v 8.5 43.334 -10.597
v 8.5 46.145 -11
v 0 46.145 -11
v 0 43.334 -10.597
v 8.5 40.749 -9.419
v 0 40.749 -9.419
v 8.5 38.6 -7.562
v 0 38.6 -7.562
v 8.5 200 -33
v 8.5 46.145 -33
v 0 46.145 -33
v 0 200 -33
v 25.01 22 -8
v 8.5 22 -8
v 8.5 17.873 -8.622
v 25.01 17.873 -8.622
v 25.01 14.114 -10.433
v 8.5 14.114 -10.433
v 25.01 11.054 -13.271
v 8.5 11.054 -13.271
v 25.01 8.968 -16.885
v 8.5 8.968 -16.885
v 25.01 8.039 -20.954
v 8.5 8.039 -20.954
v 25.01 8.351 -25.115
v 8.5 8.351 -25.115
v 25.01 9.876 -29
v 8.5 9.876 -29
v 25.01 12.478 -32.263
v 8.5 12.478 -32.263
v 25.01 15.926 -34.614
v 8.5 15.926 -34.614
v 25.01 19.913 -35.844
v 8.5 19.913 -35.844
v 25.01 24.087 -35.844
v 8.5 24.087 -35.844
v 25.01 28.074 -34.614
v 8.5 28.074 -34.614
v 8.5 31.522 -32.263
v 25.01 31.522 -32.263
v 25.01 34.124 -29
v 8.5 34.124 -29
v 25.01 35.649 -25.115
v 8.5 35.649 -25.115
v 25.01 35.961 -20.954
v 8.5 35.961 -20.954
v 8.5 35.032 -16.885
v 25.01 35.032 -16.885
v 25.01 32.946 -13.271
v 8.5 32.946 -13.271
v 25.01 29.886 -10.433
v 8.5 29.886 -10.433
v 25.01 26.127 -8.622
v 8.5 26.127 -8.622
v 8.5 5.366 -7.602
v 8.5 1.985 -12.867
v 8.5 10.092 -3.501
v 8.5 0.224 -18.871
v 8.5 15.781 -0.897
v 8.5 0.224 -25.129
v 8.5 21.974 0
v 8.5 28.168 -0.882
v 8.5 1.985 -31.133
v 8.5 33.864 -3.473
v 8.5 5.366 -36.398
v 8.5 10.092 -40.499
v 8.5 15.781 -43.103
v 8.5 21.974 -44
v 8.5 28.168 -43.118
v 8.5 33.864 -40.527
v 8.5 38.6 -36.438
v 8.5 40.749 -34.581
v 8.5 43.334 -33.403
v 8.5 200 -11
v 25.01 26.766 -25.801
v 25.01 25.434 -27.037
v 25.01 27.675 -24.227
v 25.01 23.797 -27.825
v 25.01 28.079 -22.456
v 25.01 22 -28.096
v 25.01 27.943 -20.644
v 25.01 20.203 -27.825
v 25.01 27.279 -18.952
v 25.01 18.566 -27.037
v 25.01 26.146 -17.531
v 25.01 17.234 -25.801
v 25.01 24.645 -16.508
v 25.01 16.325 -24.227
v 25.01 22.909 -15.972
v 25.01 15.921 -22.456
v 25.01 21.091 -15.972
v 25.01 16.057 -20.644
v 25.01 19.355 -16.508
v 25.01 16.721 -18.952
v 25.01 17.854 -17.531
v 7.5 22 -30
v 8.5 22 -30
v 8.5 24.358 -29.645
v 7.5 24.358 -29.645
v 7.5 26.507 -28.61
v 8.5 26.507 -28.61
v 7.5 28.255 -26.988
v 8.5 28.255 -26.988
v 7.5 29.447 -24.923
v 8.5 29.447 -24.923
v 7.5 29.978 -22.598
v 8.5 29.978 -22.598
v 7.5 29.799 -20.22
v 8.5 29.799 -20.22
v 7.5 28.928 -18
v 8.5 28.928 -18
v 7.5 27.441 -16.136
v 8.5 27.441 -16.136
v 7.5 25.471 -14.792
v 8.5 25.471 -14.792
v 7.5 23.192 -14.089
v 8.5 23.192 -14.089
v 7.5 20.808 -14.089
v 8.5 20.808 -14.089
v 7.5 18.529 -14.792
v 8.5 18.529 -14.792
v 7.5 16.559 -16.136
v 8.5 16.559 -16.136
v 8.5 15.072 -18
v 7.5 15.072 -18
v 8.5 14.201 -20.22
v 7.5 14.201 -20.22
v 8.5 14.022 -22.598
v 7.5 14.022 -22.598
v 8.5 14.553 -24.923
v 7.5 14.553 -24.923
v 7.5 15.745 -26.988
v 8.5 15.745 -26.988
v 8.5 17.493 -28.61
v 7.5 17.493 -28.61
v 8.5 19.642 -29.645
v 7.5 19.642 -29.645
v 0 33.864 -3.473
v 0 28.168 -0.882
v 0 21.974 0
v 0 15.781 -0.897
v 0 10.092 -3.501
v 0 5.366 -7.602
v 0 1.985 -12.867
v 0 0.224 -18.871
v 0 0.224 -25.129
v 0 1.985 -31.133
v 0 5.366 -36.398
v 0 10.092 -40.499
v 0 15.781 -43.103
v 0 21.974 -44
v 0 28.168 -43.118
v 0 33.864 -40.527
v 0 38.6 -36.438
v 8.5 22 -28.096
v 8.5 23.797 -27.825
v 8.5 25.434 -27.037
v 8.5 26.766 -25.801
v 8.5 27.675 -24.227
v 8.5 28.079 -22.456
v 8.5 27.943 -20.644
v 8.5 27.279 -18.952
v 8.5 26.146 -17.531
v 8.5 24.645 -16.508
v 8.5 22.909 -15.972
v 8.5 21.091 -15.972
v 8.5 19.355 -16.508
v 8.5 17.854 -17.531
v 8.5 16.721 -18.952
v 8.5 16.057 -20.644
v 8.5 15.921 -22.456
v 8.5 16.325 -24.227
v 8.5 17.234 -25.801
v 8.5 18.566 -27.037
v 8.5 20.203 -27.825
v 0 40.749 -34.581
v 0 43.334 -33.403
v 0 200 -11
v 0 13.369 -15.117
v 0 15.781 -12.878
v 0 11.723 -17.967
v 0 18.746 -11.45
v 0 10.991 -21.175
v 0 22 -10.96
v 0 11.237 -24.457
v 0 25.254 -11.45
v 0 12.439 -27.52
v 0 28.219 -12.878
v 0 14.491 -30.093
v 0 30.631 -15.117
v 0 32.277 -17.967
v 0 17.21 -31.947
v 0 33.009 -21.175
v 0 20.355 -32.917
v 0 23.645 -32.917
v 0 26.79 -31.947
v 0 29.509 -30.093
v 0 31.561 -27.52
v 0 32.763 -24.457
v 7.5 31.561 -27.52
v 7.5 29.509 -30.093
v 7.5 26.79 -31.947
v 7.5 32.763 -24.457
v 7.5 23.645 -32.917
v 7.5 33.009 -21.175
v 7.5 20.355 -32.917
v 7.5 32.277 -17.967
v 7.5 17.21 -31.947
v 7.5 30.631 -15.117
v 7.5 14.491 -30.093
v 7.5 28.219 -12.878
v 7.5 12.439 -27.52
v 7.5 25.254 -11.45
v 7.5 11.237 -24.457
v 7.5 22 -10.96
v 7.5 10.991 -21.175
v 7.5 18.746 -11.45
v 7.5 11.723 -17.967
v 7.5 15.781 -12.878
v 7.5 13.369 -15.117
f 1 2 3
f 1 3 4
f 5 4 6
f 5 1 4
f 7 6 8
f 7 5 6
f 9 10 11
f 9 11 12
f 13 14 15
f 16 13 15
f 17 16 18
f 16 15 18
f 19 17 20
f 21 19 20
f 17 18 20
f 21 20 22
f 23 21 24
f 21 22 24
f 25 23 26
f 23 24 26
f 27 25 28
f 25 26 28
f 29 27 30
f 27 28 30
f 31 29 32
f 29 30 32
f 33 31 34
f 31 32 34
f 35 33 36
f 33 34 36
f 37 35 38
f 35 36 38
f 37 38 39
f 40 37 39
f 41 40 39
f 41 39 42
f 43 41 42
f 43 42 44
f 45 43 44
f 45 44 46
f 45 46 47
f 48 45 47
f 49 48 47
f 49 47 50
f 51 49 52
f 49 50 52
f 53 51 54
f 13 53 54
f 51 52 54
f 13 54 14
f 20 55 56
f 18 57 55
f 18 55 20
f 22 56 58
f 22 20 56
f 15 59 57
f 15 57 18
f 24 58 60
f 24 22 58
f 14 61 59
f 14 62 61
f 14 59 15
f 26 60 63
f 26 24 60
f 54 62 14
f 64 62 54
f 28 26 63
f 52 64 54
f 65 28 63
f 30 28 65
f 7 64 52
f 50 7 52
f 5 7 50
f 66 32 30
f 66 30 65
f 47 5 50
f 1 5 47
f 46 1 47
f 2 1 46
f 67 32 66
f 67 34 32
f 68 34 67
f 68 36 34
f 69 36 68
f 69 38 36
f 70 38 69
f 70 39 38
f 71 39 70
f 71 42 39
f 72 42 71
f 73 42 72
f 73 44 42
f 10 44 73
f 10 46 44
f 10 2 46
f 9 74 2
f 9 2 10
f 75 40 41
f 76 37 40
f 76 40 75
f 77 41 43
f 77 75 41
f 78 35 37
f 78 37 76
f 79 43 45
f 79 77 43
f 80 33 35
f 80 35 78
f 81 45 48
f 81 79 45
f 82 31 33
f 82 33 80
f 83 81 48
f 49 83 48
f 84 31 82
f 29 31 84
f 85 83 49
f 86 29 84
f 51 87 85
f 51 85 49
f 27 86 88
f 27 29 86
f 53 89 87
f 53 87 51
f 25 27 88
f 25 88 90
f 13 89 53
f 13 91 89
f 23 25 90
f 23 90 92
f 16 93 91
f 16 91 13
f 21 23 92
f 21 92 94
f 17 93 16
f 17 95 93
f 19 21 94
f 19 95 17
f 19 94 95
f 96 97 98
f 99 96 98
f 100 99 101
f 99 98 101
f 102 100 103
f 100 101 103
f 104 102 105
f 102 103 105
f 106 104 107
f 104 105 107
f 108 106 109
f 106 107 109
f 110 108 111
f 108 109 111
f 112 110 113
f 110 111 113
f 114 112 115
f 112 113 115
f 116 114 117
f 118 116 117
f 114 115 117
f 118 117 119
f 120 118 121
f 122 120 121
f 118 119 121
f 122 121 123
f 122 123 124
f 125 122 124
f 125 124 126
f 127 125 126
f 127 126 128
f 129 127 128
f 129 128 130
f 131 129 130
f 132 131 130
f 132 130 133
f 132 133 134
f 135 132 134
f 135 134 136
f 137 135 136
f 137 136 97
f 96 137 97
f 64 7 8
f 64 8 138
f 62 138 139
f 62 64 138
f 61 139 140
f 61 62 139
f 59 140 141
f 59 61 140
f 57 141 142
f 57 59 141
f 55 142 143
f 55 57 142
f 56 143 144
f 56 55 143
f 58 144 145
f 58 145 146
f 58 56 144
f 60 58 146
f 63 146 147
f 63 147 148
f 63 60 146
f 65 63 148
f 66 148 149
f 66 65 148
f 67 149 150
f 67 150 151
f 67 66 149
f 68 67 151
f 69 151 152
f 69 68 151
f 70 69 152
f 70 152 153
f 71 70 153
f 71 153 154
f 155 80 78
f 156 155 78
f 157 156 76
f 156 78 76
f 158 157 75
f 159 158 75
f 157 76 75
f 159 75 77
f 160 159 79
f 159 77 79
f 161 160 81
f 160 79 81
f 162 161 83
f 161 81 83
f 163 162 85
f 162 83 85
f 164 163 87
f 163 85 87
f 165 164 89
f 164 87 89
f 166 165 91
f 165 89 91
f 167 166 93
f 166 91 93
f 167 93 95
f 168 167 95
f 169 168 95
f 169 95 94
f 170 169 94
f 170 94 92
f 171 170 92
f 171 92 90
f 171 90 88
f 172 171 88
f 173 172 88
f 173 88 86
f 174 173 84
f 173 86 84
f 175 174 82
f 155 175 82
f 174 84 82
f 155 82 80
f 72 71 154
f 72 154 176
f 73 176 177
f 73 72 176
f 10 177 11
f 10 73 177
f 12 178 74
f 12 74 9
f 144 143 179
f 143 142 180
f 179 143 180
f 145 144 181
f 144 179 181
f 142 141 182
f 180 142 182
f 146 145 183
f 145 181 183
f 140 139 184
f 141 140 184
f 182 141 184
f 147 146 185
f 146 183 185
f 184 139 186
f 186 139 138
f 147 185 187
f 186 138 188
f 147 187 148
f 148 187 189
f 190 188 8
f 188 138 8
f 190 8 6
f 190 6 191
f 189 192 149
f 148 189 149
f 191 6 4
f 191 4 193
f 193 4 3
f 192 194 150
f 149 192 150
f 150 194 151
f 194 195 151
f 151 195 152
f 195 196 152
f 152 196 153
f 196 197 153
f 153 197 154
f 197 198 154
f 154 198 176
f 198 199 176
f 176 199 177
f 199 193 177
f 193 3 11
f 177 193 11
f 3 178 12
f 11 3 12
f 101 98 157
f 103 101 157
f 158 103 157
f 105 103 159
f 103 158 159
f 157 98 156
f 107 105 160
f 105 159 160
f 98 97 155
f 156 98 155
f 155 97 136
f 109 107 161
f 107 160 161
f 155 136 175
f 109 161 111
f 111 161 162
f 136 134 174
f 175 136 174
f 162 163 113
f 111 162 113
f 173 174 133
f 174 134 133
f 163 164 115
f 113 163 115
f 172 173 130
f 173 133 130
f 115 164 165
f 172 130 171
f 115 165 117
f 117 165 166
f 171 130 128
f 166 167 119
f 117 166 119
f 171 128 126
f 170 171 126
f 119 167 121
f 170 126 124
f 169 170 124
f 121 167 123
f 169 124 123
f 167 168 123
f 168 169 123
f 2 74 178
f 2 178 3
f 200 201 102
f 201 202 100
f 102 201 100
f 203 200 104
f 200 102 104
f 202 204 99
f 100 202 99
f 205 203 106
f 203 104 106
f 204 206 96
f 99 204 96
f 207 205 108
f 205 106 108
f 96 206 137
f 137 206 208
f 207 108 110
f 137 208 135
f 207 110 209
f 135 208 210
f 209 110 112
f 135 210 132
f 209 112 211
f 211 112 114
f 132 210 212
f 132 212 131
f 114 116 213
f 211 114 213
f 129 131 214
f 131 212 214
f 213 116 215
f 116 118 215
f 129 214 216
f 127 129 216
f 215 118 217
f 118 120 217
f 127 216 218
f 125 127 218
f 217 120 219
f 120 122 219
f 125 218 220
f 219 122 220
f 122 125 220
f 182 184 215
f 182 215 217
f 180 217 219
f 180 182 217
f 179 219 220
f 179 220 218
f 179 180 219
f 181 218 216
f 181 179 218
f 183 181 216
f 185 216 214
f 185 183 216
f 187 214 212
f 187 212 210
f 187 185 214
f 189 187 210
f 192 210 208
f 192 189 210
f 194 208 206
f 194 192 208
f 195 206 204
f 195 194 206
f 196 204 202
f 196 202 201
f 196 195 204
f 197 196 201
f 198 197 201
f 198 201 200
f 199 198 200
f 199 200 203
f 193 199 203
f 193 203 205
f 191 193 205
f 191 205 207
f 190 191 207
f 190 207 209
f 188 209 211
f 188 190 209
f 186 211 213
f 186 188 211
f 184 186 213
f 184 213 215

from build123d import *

# Parameters (mm, degrees)
SKETCH2_W           = 44
SKETCH2_H           = 200
BOSS_EXTRUDE2_DEPTH = 8.5
SKETCH4_R           = 11.04
CUT_EXTRUDE1_DEPTH  = 7.5
SKETCH5_OUTSIDE_W   = 86.992
SKETCH5_OUTSIDE_H   = 242.992
SKETCH5_OUTSIDE_R   = 8
CUT_EXTRUDE2_DEPTH  = 10
SKETCH6_R           = 14
BOSS_EXTRUDE3_DEPTH = 16.51
SKETCH8_R           = 6.096
CUT_EXTRUDE4_DEPTH  = 16.51


with BuildPart() as part:
    # Sketch2 → Boss-Extrude2 (new body)
    with BuildSketch(Plane(origin=(0, 0, 0), x_dir=(0, 0, -1), z_dir=(1, 0, 0))):
        with Locations((22, 100)):
            Rectangle(SKETCH2_W, SKETCH2_H)
    extrude(amount=BOSS_EXTRUDE2_DEPTH)

    # Sketch4 → Cut-Extrude1 (cut)
    with BuildSketch(Plane(origin=(0, 0, 0), x_dir=(0, 0, -1), z_dir=(1, 0, 0))):
        with Locations(Location((22, 22, 0), (0, 0, 180))):
            Circle(SKETCH4_R)
    extrude(amount=CUT_EXTRUDE1_DEPTH, mode=Mode.SUBTRACT)

    # Sketch5 outside → Cut-Extrude2 (cut)
    # profile 1 of 2: a face of its own
    with BuildSketch(Plane(origin=(8.5, 0, 0), x_dir=(0, 0, -1), z_dir=(1, 0, 0))):
        with Locations((22, 100)):
            Rectangle(SKETCH5_OUTSIDE_W, SKETCH5_OUTSIDE_H)
        with BuildLine():
            Line((11, 200), (11, 46.145392935))
            ThreePointArc((11, 46.145392935), (10.100137362, 41.999611947), (7.5625, 38.599957643))
            ThreePointArc((7.5625, 38.599957643), (22, 0), (36.4375, 38.599957643))
            ThreePointArc((36.4375, 38.599957643), (33.899862638, 41.999611947), (33, 46.145392935))
            Line((33, 46.145392935), (33, 200))
            Line((33, 200), (11, 200))
        make_face(mode=Mode.SUBTRACT)
    # profile 2 of 2: a face of its own
    with BuildSketch(Plane(origin=(8.5, 0, 0), x_dir=(0, 0, -1), z_dir=(1, 0, 0))):
        with Locations((22, 22)):
            Circle(SKETCH5_OUTSIDE_R)
    extrude(amount=-CUT_EXTRUDE2_DEPTH, mode=Mode.SUBTRACT)

    # Sketch6 → Boss-Extrude3 (add)
    with BuildSketch(Plane(origin=(8.5, 0, 0), x_dir=(0, 0, -1), z_dir=(1, 0, 0))):
        with Locations(Location((22, 22, 0), (0, 0, 180))):
            Circle(SKETCH6_R)
    extrude(amount=BOSS_EXTRUDE3_DEPTH)

    # Sketch8 → Cut-Extrude4 (cut)
    with BuildSketch(Plane(origin=(25.01, 0, 0), x_dir=(0, 0, -1), z_dir=(1, 0, 0))):
        with Locations((22, 22)):
            Circle(SKETCH8_R)
    extrude(amount=-CUT_EXTRUDE4_DEPTH, mode=Mode.SUBTRACT)


solid = part.part
